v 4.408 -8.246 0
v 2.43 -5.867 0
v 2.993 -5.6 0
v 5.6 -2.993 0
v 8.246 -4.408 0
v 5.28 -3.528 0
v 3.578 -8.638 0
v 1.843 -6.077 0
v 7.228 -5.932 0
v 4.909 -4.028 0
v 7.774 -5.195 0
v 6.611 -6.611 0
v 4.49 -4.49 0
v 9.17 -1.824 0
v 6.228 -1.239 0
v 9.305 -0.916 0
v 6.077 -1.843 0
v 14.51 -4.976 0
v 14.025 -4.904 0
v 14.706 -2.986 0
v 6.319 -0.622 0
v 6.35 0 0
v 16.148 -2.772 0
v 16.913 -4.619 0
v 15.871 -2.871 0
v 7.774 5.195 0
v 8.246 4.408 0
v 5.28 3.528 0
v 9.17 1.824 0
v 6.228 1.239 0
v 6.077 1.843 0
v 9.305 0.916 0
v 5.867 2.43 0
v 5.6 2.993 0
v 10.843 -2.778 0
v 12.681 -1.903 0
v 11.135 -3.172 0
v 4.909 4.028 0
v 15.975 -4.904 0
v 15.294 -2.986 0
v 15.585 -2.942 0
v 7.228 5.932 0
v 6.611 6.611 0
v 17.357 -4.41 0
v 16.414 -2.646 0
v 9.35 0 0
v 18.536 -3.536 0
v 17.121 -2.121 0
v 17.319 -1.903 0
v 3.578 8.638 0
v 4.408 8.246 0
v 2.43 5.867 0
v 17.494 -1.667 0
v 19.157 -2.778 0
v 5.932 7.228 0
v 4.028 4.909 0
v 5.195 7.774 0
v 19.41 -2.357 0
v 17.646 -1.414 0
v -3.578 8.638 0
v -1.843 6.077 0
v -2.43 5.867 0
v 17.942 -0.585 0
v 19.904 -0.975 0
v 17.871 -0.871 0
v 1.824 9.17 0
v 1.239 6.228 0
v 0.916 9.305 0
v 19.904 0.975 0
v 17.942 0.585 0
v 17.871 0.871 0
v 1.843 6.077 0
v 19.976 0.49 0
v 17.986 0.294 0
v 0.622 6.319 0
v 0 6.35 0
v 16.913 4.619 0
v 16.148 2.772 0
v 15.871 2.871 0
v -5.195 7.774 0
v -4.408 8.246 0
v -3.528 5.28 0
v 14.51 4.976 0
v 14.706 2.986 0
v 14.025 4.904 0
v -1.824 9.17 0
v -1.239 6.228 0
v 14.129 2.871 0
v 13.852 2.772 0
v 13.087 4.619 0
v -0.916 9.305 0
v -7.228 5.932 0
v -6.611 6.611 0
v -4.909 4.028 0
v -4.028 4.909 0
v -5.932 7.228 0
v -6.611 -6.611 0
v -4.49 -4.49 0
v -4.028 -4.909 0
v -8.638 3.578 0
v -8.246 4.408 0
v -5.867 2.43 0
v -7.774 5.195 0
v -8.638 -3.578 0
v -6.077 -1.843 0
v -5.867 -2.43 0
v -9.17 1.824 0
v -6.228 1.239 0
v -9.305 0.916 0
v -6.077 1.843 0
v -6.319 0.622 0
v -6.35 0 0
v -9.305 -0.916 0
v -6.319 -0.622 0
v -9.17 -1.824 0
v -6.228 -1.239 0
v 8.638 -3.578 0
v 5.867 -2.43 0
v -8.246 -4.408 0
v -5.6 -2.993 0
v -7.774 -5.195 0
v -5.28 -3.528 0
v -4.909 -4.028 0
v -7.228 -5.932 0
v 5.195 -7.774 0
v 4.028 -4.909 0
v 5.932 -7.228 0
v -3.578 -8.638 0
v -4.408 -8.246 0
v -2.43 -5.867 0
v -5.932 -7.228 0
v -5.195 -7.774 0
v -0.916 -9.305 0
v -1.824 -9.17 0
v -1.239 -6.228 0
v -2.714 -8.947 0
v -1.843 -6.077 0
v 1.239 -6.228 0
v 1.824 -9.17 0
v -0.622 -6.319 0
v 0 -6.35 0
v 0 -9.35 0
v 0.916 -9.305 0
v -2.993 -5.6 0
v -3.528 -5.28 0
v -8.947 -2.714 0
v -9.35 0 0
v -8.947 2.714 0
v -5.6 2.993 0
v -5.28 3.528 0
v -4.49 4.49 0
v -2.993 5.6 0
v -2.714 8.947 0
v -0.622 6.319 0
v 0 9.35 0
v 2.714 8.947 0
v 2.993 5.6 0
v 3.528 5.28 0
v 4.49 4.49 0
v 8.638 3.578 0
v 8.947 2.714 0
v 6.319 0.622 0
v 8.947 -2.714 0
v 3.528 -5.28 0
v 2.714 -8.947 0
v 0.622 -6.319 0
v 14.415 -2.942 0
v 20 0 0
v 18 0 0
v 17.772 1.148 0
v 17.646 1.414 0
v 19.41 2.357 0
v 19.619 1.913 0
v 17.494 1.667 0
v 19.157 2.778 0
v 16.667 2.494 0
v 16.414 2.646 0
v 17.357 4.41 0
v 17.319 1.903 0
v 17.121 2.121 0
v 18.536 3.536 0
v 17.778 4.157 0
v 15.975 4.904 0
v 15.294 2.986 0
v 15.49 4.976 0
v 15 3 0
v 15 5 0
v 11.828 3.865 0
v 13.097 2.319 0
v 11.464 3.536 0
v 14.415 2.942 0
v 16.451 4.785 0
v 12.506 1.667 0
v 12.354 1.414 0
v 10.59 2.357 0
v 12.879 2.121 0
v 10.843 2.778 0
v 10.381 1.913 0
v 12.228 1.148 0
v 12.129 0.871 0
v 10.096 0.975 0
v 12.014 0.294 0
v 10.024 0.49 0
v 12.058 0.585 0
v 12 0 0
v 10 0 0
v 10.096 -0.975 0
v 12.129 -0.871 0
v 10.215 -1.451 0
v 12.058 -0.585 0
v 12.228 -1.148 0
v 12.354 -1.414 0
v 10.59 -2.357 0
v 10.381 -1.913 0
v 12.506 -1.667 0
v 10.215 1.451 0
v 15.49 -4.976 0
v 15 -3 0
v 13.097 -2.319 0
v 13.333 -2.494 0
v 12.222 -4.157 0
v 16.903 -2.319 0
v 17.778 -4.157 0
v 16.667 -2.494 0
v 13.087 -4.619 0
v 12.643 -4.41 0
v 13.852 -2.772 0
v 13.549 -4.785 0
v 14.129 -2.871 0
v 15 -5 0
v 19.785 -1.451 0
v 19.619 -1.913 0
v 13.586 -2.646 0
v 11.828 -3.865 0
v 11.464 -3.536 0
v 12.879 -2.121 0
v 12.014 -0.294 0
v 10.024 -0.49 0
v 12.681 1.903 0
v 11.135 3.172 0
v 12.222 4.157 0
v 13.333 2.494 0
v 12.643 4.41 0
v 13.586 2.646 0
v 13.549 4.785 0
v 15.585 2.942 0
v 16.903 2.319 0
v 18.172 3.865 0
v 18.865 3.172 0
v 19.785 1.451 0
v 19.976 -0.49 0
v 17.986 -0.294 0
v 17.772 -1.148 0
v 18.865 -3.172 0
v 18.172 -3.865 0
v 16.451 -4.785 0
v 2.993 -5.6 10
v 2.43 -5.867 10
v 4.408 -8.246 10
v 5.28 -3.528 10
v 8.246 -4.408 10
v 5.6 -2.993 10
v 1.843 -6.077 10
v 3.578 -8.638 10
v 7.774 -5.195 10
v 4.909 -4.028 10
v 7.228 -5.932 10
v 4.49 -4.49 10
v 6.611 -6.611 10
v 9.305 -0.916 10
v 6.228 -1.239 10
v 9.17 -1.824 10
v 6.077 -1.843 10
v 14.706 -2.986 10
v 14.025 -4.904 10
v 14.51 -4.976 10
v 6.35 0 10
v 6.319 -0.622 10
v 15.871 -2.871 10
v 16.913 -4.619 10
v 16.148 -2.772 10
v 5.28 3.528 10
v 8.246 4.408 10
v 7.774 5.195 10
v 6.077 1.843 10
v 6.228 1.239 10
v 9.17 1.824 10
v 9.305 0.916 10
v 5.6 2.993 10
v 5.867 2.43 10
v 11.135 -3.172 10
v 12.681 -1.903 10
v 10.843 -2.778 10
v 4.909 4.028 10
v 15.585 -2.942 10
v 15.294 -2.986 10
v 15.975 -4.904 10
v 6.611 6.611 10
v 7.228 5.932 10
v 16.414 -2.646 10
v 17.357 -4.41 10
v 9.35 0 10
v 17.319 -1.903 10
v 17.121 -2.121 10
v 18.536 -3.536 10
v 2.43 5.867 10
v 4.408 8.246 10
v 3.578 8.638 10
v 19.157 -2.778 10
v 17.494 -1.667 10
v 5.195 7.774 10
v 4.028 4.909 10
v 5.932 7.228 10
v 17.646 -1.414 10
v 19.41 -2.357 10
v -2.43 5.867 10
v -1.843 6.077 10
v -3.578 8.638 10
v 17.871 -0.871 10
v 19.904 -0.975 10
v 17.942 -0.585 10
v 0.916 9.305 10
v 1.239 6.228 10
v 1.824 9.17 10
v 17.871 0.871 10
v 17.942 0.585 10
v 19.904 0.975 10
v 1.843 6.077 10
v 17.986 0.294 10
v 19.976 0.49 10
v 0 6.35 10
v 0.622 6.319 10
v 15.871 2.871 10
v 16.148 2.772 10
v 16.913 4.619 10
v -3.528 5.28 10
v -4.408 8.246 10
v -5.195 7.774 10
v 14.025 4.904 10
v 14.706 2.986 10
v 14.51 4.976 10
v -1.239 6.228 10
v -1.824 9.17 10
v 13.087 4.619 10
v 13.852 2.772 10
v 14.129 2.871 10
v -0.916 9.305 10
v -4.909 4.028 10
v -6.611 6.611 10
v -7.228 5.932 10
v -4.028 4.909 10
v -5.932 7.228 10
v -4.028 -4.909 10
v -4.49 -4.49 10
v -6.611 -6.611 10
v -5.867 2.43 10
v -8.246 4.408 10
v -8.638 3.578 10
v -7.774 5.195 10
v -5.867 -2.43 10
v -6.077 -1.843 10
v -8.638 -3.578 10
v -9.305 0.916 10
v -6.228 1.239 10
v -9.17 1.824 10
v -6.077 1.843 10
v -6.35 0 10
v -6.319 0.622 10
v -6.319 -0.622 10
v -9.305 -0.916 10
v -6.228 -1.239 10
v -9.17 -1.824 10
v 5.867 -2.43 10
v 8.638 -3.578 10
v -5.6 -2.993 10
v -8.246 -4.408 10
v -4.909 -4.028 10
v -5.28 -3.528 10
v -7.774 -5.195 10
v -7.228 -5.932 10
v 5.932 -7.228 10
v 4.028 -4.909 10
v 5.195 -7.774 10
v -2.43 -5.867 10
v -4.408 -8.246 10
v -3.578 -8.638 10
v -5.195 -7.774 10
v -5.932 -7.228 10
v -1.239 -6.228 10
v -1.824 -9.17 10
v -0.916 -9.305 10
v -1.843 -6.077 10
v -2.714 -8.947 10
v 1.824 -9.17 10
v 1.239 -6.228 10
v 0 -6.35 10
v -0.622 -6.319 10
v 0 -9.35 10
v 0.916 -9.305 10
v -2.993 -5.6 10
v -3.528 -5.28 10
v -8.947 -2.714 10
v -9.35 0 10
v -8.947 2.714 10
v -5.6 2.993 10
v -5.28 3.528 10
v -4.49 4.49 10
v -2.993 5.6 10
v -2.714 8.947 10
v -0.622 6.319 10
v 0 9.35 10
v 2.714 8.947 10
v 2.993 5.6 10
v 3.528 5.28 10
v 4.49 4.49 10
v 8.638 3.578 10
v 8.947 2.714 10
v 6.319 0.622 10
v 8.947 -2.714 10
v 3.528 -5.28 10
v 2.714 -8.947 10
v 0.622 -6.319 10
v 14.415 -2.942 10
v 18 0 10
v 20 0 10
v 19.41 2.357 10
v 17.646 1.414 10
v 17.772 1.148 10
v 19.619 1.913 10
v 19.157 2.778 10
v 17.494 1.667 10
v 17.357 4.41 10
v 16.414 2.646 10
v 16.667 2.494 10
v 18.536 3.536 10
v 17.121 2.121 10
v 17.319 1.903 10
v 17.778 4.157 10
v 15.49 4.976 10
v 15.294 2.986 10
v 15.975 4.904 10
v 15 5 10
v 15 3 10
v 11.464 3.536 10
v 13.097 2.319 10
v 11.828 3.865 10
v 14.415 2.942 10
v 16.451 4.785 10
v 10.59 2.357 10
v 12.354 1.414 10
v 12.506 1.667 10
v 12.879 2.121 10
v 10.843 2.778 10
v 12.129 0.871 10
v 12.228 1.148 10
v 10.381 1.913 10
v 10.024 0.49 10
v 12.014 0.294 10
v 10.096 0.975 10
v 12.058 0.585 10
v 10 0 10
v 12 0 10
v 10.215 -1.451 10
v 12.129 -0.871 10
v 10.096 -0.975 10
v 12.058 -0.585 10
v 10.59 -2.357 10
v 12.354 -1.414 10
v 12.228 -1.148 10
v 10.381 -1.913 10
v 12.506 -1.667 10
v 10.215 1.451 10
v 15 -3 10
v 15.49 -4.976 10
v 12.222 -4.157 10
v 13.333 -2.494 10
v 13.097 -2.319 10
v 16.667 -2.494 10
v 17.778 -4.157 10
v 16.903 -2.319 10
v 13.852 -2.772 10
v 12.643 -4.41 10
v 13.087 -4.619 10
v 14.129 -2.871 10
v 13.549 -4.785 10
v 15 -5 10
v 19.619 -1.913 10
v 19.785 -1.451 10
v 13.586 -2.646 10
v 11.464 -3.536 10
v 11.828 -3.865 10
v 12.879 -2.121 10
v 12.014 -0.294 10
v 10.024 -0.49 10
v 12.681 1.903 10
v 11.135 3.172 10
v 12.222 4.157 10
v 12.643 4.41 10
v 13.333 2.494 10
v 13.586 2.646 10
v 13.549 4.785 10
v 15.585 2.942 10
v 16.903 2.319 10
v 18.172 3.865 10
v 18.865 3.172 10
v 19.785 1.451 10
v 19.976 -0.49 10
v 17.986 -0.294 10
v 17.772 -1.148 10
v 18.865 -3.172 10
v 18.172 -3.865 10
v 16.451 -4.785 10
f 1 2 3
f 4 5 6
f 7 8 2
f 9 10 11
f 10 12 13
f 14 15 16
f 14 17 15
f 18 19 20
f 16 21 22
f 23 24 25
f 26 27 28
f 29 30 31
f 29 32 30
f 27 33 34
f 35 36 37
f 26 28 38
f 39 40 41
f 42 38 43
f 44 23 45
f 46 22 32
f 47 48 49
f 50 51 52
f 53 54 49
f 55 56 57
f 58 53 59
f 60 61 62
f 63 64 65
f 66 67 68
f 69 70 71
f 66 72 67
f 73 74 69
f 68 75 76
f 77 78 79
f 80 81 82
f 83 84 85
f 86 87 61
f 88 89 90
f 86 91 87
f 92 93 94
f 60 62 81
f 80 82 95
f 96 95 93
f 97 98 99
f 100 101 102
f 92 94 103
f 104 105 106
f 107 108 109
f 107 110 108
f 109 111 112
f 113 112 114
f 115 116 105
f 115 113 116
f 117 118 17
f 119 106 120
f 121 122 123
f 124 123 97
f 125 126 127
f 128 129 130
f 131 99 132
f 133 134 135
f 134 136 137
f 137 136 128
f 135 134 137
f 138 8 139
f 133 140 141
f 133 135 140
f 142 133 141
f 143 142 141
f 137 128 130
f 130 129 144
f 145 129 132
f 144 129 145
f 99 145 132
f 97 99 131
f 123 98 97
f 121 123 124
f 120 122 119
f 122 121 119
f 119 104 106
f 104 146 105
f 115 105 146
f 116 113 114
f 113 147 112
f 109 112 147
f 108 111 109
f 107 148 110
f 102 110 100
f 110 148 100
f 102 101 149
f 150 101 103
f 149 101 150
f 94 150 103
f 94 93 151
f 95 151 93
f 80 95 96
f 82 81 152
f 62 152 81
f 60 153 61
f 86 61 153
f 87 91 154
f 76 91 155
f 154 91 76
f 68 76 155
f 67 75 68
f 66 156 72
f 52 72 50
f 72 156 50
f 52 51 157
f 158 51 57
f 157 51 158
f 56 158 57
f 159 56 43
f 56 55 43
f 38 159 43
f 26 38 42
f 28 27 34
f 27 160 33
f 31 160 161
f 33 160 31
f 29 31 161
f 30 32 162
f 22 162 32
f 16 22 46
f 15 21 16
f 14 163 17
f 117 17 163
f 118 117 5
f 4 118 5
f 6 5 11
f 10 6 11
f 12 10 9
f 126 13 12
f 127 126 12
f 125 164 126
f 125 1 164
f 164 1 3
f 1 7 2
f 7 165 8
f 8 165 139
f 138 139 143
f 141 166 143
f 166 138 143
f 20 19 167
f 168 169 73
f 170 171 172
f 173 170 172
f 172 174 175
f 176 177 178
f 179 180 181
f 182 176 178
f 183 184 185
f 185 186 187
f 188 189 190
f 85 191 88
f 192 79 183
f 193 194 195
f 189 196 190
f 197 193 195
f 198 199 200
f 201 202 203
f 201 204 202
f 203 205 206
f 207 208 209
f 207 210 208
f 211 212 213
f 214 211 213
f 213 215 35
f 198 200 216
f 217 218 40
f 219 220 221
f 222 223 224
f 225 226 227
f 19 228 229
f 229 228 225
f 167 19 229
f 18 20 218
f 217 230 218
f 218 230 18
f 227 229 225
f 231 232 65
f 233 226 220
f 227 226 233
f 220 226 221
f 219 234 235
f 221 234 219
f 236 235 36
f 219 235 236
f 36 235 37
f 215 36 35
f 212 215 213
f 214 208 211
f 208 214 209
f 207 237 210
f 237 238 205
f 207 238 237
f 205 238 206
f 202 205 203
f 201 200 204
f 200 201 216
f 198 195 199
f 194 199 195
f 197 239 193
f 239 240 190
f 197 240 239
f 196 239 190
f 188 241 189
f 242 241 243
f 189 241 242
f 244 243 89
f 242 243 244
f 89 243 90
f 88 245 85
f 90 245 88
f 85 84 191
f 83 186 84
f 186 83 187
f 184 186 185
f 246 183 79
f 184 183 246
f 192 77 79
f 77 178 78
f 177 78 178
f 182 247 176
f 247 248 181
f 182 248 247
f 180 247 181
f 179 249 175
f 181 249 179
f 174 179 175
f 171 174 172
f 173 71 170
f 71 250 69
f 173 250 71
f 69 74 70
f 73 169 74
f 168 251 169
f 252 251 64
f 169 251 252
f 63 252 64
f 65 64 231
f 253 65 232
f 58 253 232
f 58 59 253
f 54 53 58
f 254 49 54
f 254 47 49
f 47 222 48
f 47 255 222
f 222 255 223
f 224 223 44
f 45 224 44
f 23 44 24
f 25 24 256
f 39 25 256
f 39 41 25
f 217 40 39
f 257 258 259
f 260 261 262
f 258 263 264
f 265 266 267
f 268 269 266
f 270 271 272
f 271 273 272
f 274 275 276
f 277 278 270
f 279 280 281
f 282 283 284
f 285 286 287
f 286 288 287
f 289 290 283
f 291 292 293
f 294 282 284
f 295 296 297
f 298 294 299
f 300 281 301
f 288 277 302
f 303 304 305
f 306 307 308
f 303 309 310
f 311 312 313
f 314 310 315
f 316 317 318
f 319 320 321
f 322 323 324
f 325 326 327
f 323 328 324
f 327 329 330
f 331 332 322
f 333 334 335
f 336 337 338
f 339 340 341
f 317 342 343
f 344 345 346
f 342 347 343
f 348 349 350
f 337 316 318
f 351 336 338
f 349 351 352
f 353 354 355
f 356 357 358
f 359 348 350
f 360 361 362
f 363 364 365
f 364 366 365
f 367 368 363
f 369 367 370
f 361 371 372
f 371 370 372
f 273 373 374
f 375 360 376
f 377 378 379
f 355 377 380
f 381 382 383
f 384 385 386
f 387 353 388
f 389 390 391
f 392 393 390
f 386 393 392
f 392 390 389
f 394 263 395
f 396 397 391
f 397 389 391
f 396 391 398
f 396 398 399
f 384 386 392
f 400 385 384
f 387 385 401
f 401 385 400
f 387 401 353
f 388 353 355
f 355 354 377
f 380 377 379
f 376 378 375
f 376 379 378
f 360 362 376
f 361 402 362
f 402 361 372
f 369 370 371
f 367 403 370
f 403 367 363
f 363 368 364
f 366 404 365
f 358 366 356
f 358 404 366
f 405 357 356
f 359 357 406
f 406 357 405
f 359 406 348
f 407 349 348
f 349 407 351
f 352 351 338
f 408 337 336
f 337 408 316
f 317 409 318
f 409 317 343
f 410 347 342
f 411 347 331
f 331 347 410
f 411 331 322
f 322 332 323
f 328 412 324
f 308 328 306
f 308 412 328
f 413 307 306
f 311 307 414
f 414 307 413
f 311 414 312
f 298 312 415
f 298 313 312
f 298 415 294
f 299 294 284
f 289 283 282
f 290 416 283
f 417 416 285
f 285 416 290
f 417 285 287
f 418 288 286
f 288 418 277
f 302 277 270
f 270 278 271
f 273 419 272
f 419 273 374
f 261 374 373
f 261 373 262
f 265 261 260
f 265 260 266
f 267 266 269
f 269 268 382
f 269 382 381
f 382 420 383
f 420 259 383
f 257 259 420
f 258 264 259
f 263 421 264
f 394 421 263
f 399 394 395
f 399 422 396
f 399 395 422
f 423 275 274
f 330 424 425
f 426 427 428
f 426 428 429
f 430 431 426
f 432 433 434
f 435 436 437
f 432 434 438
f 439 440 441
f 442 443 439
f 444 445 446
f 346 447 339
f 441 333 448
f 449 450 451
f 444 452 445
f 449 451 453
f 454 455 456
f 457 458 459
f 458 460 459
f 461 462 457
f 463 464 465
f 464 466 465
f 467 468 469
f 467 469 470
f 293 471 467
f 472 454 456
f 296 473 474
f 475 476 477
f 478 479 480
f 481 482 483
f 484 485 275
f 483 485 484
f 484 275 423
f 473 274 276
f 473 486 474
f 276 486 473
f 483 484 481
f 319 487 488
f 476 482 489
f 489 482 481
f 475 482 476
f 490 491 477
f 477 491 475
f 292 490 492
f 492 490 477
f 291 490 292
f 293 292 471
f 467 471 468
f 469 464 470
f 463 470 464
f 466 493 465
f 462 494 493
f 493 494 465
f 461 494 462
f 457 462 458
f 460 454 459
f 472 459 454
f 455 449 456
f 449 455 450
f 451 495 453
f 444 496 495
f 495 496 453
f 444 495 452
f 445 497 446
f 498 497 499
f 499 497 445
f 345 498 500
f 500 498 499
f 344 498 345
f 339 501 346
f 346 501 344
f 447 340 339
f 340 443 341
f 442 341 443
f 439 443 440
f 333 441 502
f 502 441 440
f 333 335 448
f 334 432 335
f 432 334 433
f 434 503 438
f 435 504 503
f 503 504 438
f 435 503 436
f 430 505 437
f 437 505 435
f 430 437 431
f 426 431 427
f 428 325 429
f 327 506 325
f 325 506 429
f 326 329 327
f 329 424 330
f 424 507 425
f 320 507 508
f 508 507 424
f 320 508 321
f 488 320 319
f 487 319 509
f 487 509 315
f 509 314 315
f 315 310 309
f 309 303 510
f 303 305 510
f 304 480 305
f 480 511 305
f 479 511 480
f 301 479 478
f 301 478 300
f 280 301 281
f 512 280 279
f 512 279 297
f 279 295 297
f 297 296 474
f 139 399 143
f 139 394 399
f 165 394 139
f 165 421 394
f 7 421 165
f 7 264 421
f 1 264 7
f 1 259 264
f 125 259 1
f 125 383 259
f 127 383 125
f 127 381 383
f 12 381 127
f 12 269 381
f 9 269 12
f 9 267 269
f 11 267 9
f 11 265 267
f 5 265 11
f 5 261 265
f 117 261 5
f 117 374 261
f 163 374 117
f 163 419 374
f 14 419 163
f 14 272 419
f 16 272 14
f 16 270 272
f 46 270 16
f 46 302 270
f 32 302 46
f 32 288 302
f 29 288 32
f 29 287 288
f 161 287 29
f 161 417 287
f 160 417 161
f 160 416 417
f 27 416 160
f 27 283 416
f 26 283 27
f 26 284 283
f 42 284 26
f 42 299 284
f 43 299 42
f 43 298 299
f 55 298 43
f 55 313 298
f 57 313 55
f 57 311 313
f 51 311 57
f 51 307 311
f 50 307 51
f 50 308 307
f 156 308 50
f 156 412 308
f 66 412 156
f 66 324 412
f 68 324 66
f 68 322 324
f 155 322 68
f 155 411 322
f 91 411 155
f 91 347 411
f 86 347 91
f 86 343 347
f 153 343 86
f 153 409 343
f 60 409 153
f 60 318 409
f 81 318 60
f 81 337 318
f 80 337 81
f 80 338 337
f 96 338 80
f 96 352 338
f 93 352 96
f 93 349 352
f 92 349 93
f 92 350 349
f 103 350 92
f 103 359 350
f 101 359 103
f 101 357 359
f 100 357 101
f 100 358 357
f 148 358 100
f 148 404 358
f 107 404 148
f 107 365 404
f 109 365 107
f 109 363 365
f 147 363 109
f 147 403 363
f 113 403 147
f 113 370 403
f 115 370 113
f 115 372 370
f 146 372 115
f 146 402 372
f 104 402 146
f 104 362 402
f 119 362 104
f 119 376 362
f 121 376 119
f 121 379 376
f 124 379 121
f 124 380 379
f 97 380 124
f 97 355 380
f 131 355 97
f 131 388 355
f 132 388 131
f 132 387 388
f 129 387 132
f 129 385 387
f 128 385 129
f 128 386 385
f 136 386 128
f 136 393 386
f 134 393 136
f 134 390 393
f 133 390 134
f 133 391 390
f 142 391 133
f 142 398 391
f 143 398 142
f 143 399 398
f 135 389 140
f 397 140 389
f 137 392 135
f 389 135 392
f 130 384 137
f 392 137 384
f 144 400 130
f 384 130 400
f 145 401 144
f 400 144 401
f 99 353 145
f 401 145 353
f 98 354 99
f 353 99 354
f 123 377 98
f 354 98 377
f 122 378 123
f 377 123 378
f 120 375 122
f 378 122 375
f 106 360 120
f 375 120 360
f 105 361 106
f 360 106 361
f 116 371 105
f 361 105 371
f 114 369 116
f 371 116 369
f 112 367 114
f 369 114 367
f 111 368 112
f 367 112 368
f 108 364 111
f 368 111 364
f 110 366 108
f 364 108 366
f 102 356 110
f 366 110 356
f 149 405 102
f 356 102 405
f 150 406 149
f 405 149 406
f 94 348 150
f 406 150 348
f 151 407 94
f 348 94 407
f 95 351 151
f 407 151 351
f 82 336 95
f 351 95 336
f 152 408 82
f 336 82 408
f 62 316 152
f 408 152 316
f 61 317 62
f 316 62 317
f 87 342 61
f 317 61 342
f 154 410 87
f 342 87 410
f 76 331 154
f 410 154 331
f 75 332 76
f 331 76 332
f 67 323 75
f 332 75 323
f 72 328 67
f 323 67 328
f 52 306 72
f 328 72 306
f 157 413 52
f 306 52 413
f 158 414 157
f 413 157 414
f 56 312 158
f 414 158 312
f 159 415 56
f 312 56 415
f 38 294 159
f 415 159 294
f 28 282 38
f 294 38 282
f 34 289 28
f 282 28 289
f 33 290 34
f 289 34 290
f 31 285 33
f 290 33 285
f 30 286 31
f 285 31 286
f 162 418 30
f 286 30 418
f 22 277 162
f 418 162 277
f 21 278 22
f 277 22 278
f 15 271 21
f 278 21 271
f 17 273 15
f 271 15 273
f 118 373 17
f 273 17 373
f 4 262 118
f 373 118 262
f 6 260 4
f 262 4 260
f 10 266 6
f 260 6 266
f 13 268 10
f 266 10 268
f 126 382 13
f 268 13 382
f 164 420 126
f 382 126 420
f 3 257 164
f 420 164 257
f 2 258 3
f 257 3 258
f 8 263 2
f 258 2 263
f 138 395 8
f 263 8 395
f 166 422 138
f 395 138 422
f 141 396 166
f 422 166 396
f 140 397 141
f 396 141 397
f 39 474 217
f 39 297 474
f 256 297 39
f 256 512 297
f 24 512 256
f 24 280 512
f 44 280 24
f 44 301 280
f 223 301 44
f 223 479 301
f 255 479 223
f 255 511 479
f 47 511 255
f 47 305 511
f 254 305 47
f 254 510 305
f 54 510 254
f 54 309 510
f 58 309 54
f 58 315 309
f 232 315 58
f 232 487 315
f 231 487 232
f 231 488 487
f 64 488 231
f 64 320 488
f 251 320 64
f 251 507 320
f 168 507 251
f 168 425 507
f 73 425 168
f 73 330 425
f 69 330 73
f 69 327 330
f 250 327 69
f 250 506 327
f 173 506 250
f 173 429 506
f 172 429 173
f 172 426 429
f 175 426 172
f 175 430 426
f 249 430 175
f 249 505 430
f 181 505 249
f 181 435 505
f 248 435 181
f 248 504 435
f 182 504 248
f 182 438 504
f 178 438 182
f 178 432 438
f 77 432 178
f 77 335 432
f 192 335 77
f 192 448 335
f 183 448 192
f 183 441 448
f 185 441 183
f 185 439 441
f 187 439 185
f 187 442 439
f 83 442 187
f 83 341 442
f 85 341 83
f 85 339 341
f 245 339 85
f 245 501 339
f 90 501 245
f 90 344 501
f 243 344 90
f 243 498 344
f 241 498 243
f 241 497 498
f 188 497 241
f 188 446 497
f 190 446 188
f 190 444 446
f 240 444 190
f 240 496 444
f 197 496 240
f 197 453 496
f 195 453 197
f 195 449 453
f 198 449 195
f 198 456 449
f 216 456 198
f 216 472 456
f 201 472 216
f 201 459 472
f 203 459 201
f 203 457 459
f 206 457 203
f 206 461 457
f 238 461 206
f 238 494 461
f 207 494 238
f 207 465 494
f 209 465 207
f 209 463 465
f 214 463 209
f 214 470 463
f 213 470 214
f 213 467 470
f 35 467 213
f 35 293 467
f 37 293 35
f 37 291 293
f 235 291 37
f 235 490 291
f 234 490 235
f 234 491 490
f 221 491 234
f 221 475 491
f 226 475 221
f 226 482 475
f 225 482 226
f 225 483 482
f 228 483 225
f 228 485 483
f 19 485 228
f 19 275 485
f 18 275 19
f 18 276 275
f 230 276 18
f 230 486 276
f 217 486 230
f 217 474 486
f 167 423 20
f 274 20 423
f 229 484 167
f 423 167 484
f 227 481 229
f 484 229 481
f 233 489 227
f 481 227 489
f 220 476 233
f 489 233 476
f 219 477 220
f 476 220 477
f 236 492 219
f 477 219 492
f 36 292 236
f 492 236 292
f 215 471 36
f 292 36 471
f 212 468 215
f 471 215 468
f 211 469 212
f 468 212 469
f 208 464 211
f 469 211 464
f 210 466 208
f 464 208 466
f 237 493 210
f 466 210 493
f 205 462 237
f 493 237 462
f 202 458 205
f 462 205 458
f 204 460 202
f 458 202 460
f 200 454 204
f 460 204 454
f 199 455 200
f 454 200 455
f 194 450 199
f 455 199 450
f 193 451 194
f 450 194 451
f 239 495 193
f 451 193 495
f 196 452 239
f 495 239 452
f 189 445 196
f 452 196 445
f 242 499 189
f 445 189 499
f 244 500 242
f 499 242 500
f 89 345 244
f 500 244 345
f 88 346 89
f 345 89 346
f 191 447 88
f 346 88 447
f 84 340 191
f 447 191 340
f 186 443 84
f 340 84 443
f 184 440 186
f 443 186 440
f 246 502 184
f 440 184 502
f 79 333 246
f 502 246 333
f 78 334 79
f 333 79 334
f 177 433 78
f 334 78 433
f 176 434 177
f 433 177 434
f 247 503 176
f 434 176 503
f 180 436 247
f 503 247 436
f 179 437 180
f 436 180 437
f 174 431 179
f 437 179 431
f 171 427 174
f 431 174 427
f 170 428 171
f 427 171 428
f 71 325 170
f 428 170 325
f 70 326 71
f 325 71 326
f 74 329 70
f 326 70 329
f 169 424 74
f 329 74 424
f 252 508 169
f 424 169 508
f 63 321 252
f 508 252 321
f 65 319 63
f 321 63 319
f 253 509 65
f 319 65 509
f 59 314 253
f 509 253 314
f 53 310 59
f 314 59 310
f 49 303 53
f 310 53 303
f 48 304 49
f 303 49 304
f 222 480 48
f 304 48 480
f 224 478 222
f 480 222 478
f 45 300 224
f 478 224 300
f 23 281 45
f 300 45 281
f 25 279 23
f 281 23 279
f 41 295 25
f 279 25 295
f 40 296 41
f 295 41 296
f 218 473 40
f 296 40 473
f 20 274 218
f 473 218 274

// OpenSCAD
$fn = 64;

// Dimensions
rod_diameter = 12.7;           // Inner diameter of rod ring
rod_wall = 3;                 // Wall thickness of rod ring
rod_outer_diameter = rod_diameter + 2 * rod_wall; // 18.7 mm

tubing_inner_diameter = 6;       // Inner diameter of tubing ring
tubing_wall = 2;               // Wall thickness of tubing ring
tubing_outer_diameter = tubing_inner_diameter + 2 * tubing_wall; // 10 mm

bridge_width_y = 6;            // Width of bridge in Y direction
bridge_x_start = 8;         // X start of bridge
bridge_x_end = 12;          // X end of bridge

// Rod ring: centered at origin, with -X side opening
rod_ring_inner_radius = rod_diameter / 2;
rod_ring_outer_radius = rod_outer_diameter / 2;

// Tubing ring: centered at (15, 0), with +X side opening
tubing_ring_center_x = 15;
tubing_ring_center_y = 0;
tubing_ring_inner_radius = tubing_inner_diameter / 2;
tubing_ring_outer_radius = tubing_outer_diameter / 2;

// Opening dimensions
rod_opening_width = 10;     // Width of opening on rod ring (-X side)
rod_opening_y_min = -rod_opening_width / 2;
rod_opening_y_max = rod_opening_width / 2;

tubing_opening_width = 4.5;     // Width of opening on tubing ring (+X side)
tubing_opening_y_min = -tubing_opening_width / 2;
tubing_opening_y_max = tubing_opening_width / 2;

// Bridge: solid between rings, 6 mm wide in Y, from x=8 to x=12
bridge_y_min = -bridge_width_y / 2;
bridge_y_max = bridge_width_y / 2;

// Main module: build 2D profile in XY plane, then extrude
module snap_clip() {
    // Use linear_extrude to make 3D from 2D profile
    linear_extrude(height = 10, center = false) {
        // Rod ring with opening on -X side
        difference() {
            // Outer ring (full circle)
            circle(r = rod_ring_outer_radius, center = [0, 0]);
            // Inner hole (full circle)
            circle(r = rod_ring_inner_radius, center = [0, 0]);
            // Cut out the opening: a rectangle from x = -rod_ring_outer_radius to x = 0, y = -5 to 5
            // Use a slightly larger rectangle to ensure full cut
            translate([-rod_ring_outer_radius - 0.1, -rod_opening_width / 2 - 0.1, 0])
            cube([rod_ring_outer_radius * 2 + 0.2, rod_opening_width + 0.2, 0.1], center = false);
        }

        // Tubing ring with opening on +X side
        translate([tubing_ring_center_x, tubing_ring_center_y, 0]) {
            difference() {
                // Outer ring (full circle)
                circle(r = tubing_ring_outer_radius, center = [0, 0]);
                // Inner hole (full circle)
                circle(r = tubing_ring_inner_radius, center = [0, 0]);
                // Cut out the opening: a rectangle from x = 15 to x = 15 + 4.5, y = -2.25 to 2.25
                translate([tubing_ring_center_x, -tubing_opening_width / 2 - 0.1, 0])
                cube([tubing_opening_width + 0.2, tubing_opening_width + 0.2, 0.1], center = false);
            }
        }

        // Bridge between rings: solid rectangle from x=8 to x=12, y=-3 to 3
        translate([bridge_x_start + (bridge_x_end - bridge_x_start)/2, 0, 0]) {
            cube([bridge_x_end - bridge_x_start, bridge_width_y, 0.1], center = false);
        }
    }
}

// Render the clip
snap_clip();
